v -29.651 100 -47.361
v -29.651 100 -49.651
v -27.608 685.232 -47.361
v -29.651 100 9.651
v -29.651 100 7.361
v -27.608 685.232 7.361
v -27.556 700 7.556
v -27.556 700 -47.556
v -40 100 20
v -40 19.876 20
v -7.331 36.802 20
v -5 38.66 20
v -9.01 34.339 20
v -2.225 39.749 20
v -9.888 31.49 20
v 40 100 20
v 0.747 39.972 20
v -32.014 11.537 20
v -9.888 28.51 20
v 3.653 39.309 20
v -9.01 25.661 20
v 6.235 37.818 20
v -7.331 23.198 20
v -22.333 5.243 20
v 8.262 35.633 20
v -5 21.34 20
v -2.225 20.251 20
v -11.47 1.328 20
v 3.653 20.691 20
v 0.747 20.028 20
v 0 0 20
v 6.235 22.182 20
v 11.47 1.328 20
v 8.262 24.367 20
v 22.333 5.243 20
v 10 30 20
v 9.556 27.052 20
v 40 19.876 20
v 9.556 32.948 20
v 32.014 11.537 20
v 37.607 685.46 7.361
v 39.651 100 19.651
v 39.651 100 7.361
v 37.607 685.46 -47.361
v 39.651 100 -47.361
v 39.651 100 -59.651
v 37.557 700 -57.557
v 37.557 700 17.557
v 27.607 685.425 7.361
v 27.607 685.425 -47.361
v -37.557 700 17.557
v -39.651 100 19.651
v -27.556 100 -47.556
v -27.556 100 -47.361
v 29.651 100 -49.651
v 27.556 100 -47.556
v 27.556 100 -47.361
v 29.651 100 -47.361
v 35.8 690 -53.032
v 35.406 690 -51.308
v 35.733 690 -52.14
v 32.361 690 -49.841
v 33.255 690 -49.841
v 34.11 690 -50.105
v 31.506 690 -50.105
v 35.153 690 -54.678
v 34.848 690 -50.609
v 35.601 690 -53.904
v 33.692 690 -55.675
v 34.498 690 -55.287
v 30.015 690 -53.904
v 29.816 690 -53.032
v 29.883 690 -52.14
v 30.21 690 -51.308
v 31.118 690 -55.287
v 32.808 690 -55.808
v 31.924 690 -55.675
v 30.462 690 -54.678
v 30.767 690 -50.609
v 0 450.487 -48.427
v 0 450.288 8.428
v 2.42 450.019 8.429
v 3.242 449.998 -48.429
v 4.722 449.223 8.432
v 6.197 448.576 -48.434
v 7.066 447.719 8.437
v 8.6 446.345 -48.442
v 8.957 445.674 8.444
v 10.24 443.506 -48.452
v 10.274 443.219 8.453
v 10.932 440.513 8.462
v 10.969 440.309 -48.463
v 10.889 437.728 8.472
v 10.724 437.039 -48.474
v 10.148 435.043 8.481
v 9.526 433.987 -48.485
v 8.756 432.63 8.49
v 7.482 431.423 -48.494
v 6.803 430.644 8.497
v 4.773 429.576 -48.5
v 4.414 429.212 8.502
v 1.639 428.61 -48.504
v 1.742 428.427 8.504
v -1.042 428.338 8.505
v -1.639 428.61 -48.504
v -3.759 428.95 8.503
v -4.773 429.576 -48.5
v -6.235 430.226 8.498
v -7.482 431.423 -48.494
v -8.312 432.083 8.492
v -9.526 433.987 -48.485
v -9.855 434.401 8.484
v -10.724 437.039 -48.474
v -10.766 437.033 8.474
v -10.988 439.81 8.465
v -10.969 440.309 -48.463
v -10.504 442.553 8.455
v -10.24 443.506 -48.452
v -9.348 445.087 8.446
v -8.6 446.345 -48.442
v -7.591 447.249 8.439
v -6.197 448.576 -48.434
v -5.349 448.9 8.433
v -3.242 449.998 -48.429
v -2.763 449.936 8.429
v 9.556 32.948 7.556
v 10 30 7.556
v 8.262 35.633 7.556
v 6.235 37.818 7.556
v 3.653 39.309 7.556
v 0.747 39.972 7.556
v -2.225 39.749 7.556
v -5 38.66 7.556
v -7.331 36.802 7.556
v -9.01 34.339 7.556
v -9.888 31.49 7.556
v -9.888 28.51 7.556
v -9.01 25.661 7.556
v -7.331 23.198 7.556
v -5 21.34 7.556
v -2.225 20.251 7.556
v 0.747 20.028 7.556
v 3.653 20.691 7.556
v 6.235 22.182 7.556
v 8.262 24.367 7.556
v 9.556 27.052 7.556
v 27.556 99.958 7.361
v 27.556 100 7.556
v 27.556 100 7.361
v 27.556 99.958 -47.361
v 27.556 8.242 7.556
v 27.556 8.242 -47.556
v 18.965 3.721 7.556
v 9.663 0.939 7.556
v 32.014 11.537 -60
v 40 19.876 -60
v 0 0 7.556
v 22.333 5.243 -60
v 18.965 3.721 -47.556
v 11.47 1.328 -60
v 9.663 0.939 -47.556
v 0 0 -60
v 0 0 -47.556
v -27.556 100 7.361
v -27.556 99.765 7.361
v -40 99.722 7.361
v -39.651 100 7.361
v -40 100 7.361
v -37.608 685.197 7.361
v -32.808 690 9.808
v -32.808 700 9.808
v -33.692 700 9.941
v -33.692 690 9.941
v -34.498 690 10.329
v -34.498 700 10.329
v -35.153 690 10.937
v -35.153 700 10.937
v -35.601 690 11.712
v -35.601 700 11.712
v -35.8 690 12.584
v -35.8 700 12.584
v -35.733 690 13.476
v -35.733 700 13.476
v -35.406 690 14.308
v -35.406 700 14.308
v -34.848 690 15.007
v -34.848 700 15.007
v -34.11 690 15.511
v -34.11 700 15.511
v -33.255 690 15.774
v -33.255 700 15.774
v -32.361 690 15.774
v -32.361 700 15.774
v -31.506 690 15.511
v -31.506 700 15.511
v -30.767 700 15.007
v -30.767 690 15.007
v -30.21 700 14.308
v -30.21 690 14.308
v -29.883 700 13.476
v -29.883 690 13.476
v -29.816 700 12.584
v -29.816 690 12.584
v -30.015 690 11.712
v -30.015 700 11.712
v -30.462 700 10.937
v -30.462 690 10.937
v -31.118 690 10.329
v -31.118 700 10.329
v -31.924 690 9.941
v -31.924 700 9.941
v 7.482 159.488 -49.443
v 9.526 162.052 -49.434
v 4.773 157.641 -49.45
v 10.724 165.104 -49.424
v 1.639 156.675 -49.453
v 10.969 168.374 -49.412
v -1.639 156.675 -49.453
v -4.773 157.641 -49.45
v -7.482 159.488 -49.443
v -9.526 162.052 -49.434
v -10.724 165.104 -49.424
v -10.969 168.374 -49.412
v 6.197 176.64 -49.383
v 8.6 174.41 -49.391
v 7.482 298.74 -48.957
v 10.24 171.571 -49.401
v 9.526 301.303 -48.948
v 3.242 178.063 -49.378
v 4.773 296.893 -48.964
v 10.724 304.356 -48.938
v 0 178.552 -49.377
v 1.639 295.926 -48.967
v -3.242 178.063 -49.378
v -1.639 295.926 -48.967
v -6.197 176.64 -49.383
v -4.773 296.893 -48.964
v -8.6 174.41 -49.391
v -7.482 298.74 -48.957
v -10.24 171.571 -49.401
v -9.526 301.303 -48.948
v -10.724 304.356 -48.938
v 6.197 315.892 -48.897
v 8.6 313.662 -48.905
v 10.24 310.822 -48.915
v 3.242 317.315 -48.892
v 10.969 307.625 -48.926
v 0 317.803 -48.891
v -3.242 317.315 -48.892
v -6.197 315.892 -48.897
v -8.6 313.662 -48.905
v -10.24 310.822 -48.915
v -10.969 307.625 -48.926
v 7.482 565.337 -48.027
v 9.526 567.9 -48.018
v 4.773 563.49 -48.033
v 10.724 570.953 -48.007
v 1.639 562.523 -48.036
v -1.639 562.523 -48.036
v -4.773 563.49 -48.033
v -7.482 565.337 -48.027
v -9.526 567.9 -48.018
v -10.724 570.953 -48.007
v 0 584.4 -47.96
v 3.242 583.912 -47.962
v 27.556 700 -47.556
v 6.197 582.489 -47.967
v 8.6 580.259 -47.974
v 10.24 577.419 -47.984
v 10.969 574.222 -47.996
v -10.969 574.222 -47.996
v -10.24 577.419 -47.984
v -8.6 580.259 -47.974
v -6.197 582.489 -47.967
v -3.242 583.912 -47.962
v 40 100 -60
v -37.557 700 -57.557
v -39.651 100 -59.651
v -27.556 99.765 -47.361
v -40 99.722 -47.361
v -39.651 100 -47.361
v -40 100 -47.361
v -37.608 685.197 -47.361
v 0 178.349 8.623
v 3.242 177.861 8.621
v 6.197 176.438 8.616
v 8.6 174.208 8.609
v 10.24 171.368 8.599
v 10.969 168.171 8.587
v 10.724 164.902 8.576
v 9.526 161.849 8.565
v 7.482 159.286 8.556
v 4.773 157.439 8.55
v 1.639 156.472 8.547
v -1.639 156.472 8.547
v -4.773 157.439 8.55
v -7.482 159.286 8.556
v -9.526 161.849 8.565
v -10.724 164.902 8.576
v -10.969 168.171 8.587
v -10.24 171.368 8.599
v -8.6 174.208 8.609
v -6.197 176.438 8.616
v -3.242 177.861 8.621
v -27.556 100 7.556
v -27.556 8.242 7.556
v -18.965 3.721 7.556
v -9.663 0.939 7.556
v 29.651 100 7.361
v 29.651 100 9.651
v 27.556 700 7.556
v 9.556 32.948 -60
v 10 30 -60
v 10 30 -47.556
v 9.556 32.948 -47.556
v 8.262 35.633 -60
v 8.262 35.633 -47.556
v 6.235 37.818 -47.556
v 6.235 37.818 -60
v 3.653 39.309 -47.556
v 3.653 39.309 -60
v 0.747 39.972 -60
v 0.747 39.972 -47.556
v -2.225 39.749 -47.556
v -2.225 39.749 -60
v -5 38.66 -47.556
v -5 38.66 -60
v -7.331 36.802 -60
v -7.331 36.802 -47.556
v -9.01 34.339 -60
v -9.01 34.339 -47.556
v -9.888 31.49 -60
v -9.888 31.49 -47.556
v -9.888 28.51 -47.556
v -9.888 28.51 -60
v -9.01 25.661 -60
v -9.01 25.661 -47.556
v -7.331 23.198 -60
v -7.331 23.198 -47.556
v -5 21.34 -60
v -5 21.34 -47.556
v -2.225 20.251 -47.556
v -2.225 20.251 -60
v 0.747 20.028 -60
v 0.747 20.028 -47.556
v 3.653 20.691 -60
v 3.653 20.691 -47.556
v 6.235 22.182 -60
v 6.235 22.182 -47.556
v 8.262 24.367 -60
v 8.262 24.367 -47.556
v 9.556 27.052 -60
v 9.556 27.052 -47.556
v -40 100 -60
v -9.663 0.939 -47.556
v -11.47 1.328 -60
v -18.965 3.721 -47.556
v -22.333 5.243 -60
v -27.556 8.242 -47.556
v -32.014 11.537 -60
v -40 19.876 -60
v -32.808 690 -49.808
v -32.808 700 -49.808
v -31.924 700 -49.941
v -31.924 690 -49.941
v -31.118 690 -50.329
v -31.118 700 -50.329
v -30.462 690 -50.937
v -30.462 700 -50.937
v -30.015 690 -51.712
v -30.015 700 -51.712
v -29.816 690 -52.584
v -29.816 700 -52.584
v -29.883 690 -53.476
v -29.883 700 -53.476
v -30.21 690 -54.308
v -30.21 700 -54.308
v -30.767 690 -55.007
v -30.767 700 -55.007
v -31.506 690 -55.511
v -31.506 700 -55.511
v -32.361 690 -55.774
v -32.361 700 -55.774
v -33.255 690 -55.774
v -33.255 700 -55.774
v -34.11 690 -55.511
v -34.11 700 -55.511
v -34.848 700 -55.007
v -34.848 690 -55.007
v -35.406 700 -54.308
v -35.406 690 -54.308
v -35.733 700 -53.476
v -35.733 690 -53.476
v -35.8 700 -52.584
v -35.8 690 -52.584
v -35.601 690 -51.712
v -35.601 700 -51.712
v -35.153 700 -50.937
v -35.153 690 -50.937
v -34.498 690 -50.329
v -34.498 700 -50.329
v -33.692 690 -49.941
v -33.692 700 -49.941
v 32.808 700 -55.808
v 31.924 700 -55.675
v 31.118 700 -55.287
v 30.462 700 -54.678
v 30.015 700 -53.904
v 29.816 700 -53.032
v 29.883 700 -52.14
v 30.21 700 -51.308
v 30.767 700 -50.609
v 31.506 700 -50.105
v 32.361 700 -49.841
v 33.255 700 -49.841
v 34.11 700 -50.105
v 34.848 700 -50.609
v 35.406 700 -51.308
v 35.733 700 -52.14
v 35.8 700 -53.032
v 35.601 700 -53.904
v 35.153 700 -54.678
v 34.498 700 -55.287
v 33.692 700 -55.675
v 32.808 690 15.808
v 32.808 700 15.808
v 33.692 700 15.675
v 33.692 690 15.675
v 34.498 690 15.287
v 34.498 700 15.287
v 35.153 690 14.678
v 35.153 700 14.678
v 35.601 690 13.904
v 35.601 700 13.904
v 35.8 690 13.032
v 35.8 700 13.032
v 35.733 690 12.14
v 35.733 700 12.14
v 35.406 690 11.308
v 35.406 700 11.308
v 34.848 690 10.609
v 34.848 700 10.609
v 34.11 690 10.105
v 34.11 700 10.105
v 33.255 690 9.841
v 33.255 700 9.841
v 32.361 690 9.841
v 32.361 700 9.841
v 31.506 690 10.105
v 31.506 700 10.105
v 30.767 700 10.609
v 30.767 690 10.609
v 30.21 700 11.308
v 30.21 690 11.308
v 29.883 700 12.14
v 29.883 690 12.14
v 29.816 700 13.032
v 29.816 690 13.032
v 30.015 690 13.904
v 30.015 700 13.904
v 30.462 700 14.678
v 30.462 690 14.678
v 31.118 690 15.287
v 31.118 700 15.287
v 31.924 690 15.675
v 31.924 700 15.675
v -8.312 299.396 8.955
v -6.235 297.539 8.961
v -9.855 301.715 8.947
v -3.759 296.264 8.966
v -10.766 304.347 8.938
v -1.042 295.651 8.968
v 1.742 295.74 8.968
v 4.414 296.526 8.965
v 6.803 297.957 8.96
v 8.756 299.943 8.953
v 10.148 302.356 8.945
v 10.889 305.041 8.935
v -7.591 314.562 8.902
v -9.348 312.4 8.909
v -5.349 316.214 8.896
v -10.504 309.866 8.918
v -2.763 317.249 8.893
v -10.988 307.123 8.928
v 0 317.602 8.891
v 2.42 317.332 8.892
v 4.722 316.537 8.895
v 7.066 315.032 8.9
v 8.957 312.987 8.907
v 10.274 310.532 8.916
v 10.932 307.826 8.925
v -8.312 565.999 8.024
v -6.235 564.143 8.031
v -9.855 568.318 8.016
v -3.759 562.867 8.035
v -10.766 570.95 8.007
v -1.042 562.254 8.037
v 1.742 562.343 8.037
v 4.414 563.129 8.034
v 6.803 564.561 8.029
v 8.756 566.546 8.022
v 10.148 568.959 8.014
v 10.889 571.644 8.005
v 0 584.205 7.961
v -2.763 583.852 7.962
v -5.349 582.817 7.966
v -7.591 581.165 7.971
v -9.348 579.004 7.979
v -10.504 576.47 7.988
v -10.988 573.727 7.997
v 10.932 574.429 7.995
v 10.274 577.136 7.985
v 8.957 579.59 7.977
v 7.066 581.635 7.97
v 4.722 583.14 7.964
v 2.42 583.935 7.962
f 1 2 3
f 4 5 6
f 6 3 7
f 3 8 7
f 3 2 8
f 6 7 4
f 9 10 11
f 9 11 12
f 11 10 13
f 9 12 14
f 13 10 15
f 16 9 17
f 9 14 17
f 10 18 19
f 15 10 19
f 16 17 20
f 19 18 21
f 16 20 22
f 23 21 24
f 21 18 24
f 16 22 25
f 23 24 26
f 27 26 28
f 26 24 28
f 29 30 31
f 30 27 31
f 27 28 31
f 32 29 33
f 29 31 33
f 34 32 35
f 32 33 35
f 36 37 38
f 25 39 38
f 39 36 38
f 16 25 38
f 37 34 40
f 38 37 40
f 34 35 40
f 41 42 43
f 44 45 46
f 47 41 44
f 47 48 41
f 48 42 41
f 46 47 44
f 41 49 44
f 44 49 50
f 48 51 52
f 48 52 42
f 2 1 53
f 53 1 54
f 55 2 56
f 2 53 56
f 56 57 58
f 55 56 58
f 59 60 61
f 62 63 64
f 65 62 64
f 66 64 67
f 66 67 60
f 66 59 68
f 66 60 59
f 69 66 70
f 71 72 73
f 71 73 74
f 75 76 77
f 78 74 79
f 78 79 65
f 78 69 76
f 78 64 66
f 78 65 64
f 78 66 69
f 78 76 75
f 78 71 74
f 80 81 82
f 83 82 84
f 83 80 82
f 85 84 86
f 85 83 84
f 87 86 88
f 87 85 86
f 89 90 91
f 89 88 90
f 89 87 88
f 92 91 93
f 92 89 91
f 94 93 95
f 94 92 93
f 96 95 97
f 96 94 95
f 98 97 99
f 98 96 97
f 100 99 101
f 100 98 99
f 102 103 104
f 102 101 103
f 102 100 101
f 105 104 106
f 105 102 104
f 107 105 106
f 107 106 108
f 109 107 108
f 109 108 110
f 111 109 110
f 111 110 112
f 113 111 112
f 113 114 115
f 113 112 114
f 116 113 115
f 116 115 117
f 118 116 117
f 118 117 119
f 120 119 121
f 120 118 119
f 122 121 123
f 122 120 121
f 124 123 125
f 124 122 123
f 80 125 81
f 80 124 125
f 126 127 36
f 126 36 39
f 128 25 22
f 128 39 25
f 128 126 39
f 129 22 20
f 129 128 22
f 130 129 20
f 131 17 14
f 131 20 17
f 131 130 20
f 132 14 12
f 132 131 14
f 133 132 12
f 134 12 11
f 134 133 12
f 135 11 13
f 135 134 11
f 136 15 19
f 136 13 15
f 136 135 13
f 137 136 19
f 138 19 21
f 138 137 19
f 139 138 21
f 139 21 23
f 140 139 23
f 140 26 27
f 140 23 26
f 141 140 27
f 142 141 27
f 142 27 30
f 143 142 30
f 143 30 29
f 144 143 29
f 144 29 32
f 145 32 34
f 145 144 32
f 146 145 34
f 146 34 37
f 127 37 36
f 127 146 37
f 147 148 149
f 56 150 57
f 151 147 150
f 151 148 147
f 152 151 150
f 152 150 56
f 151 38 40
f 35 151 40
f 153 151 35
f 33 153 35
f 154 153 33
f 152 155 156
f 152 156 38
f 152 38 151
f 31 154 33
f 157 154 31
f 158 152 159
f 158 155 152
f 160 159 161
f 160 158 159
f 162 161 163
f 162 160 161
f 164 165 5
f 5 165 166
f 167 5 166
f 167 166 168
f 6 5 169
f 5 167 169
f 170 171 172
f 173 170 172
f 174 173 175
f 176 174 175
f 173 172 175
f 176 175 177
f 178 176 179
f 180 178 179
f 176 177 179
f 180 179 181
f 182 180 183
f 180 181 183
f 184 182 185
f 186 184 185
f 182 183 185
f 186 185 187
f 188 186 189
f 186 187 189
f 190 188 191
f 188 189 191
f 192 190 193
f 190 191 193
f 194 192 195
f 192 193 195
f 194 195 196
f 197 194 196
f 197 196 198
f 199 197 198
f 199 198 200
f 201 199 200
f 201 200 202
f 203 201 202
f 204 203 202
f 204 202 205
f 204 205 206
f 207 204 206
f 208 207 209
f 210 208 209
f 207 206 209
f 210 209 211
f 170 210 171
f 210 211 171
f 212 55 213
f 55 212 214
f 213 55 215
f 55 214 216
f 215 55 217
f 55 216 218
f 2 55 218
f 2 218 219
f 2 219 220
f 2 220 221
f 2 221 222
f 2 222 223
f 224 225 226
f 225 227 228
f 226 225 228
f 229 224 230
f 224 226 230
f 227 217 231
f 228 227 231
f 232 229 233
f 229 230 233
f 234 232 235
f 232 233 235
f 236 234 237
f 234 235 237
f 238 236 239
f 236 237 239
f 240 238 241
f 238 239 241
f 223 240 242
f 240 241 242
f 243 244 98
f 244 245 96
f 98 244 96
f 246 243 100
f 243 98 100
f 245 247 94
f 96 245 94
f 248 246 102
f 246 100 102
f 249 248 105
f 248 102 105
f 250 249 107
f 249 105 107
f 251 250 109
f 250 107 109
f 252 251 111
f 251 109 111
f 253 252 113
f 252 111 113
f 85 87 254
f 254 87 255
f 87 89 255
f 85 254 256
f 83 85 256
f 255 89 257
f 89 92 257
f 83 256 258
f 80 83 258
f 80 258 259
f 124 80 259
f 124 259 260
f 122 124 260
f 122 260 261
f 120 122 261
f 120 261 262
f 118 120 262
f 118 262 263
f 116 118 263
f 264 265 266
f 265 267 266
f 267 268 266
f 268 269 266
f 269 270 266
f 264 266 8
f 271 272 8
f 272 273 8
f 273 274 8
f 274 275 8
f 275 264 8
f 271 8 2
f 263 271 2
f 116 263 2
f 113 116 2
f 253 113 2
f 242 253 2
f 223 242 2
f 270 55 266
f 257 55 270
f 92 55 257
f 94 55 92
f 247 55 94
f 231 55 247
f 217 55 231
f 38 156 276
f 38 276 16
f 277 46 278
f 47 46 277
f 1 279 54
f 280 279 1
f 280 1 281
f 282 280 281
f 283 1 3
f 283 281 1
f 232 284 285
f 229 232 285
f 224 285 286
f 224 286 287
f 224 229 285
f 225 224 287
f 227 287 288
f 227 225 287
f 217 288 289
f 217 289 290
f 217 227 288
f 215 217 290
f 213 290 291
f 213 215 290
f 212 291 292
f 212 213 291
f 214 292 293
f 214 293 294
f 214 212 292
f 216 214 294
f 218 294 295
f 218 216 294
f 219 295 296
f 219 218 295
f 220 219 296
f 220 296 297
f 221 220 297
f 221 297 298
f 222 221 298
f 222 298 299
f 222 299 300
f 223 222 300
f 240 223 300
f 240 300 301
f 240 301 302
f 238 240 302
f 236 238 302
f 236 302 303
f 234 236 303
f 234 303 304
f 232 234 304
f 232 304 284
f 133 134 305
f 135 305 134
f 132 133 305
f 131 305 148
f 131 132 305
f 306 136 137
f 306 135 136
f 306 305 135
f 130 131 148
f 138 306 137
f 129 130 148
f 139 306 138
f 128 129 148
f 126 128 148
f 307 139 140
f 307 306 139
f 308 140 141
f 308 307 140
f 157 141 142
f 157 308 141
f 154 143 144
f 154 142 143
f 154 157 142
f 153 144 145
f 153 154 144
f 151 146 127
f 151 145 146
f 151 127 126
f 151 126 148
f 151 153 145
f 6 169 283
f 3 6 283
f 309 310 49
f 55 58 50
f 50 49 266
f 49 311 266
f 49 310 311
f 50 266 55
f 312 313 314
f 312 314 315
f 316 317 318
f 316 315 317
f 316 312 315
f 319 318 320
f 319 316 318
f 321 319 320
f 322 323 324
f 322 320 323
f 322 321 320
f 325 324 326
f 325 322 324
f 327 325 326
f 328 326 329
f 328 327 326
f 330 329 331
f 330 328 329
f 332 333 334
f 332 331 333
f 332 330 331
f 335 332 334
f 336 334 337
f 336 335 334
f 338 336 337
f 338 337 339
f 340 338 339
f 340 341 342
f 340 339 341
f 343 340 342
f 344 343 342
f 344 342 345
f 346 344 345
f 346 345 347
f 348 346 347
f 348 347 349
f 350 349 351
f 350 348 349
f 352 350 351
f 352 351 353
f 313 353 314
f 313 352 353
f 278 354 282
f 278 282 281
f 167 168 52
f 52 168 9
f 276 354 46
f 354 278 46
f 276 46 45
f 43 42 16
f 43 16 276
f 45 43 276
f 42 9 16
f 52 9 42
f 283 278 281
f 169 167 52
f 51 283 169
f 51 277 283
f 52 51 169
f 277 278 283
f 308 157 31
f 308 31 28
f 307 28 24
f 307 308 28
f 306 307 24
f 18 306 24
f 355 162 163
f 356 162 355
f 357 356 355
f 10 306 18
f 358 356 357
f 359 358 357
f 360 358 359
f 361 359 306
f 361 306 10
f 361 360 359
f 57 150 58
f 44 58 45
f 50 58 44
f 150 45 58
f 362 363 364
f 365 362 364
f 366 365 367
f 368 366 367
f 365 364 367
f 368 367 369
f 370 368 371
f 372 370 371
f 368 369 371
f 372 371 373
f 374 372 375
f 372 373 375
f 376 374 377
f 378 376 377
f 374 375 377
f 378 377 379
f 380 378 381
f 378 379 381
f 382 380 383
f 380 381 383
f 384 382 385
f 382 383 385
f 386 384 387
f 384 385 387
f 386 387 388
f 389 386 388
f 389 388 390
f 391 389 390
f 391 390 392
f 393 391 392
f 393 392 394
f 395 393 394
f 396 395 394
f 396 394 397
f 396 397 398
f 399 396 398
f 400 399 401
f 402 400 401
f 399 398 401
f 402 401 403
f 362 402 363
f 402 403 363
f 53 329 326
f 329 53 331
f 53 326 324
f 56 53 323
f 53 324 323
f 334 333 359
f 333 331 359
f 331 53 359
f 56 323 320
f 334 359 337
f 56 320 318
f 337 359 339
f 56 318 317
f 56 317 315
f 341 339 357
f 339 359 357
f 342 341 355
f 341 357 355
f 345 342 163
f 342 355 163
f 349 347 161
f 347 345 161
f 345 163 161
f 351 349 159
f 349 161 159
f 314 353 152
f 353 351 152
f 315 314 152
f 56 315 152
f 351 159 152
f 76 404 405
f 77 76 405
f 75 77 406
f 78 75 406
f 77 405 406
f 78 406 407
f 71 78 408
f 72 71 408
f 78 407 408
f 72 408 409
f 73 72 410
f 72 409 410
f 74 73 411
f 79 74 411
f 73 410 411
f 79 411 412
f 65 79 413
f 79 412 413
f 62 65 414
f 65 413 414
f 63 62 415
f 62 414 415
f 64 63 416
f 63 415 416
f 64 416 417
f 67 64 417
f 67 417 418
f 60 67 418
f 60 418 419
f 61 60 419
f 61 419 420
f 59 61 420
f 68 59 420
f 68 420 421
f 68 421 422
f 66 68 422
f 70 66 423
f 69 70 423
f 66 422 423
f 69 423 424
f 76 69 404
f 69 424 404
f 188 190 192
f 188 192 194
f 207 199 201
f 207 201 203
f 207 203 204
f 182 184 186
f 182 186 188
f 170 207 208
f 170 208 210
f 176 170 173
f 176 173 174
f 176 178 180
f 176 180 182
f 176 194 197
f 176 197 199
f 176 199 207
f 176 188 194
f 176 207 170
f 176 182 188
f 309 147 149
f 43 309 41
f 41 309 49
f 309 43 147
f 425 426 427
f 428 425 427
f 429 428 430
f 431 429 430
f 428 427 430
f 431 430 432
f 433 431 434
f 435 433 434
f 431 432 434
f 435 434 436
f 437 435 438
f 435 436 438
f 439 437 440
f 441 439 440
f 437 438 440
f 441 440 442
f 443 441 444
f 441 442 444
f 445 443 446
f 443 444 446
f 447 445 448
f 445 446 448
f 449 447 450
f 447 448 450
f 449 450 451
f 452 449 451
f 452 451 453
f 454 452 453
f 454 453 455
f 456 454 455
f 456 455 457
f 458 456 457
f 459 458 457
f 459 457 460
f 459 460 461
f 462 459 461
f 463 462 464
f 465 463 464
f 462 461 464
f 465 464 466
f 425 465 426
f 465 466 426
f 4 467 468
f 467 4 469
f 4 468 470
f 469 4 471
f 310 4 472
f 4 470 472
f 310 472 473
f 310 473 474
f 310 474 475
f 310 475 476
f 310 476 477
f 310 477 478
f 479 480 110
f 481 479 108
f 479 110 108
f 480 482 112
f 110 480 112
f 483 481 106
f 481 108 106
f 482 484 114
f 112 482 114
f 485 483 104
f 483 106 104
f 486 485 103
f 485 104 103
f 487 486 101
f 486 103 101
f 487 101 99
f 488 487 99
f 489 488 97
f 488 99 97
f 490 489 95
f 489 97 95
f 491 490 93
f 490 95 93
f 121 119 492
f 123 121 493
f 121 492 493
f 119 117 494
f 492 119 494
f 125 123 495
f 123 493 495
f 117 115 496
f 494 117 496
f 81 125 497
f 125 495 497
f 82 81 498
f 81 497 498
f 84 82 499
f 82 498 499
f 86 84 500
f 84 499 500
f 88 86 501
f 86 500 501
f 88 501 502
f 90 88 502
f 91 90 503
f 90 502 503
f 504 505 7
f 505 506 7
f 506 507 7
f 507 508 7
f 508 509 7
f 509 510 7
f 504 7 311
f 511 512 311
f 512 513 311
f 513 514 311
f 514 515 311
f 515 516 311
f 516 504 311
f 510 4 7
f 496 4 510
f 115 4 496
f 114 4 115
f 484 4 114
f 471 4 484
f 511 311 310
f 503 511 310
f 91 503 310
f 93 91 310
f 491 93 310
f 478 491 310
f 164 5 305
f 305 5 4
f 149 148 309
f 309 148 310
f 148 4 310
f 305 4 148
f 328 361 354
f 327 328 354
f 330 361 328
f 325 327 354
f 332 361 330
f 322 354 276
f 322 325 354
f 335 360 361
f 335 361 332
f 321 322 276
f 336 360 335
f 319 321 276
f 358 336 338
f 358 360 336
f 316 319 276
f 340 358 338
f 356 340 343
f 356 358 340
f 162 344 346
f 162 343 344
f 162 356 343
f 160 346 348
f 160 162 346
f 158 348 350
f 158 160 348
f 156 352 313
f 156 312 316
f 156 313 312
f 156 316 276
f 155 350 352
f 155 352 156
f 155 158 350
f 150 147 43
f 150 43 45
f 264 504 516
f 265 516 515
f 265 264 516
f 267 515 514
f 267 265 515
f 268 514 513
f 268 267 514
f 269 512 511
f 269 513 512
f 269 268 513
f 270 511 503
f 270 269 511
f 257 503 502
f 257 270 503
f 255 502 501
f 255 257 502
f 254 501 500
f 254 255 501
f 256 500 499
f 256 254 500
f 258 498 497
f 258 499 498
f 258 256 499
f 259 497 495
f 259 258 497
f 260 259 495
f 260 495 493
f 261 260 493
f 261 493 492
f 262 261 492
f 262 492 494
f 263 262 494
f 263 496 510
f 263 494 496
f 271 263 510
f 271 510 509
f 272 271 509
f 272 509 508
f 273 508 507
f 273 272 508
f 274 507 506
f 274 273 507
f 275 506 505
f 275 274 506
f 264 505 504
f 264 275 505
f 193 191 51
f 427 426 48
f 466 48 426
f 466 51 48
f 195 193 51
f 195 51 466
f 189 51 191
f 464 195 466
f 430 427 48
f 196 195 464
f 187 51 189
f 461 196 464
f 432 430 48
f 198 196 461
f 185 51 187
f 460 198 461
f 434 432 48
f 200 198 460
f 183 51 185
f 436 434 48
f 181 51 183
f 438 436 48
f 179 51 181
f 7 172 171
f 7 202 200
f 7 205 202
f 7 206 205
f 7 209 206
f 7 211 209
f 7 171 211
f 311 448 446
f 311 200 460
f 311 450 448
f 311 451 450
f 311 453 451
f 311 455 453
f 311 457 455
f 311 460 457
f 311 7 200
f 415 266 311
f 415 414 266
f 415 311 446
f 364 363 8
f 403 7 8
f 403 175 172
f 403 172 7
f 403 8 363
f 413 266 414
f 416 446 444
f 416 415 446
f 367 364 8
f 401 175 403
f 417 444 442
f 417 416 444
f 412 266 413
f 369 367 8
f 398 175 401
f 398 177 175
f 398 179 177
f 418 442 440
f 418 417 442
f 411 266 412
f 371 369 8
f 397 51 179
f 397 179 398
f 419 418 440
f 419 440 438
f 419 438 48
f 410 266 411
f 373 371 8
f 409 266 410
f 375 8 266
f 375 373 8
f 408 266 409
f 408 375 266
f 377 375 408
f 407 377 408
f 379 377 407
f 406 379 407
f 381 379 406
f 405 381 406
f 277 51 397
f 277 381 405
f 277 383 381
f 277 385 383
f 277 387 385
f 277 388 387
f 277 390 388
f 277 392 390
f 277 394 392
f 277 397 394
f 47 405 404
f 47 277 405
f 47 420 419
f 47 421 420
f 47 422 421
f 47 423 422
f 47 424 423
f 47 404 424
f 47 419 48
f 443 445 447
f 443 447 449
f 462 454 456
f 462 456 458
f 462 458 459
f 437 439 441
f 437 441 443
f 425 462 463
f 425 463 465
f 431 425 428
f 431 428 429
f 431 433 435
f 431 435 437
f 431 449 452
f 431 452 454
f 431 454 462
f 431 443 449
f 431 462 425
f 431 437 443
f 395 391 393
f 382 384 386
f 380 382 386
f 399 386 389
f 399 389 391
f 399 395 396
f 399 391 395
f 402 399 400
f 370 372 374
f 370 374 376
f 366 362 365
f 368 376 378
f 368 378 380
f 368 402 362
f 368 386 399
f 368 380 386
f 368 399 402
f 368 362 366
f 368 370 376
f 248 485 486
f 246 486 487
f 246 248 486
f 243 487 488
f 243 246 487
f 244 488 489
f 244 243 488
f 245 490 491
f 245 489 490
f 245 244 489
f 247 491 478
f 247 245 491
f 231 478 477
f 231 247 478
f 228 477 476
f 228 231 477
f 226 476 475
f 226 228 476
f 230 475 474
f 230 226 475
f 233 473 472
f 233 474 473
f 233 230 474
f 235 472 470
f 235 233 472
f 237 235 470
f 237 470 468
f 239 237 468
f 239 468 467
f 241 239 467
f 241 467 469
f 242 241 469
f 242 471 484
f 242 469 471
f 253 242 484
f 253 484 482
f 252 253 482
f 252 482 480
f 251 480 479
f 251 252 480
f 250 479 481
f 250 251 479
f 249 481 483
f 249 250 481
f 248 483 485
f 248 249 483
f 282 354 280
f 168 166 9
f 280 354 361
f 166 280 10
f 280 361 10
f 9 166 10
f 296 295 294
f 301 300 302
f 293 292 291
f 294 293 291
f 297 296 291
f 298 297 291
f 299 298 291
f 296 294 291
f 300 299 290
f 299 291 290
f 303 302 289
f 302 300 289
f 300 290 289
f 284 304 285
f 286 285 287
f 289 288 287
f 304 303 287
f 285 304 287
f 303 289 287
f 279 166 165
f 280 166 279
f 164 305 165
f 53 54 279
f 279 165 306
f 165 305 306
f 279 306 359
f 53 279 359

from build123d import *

# Parameters (mm, degrees)
SKETCH1_W               = 80
SKETCH1_H               = 80
BOSS_EXTRUDE1_DEPTH     = 700
BOSS_EXTRUDE1_TAPER     = 0.2
SHELL2_T                = -10
SKETCH2_R               = 3
CUT_EXTRUDE1_DEPTH      = 10
CUT_EXTRUDE2_DEPTH      = 704.704483544
CUT_EXTRUDE2_DEPTH_BACK = 704.704483544
SKETCH4_W               = 55.112936398
SKETCH4_H               = 55.112936398
SKETCH8_W               = 80
SKETCH8_H               = 80
SKETCH8_W_2             = 55.112936398
SKETCH8_H_2             = 55.112936398
BOSS_EXTRUDE3_DEPTH     = 100
CUT_EXTRUDE4_DEPTH      = 706.691150691
CUT_EXTRUDE4_DEPTH_BACK = 706.691150691
SKETCH9_R               = 10
CUT_EXTRUDE5_DEPTH      = 706.691150691
CUT_EXTRUDE5_DEPTH_BACK = 706.691150691
CUT_EXTRUDE6_DEPTH      = 707.968504527
CUT_EXTRUDE6_DEPTH_BACK = 707.968504527
SKETCH13_W              = 54.721685152
SKETCH13_H              = 585.463174199
SKETCH14_R              = 11
BOSS_EXTRUDE4_DEPTH     = 68


with BuildPart() as part:
    # Sketch1 → Boss-Extrude1 (new body)
    with BuildSketch(Plane(origin=(0, 0, 0), x_dir=(1, 0, 0), z_dir=(0, 1, 0))):
        with Locations((0, 20)):
            Rectangle(SKETCH1_W, SKETCH1_H)
    extrude(amount=BOSS_EXTRUDE1_DEPTH, taper=BOSS_EXTRUDE1_TAPER)

    # Shell2
    shell2_openings = [part.faces().sort_by_distance(p)[0] for p in [
        (0, 700, -20),
    ]]
    offset(amount=SHELL2_T, openings=shell2_openings, kind=Kind.INTERSECTION)

    # Sketch2 → Cut-Extrude1 (cut)
    with BuildSketch(Plane(origin=(0, 700, 0), x_dir=(1, 0, 0), z_dir=(0, 1, 0))):
        with Locations((-32.80796506, 52.80796506)):
            Circle(SKETCH2_R)
        with Locations((32.80796506, 52.80796506)):
            Circle(SKETCH2_R)
        with Locations((32.80796506, -12.80796506)):
            Circle(SKETCH2_R)
        with Locations((-32.80796506, -12.80796506)):
            Circle(SKETCH2_R)
    extrude(amount=-CUT_EXTRUDE1_DEPTH, mode=Mode.SUBTRACT)

    # Sketch4 → Cut-Extrude2 (cut, two sides: drawn at the far end of the back side and taken through both)
    with BuildSketch(Plane(origin=(0, 700, 0), x_dir=(1, 0, 0), z_dir=(0, 1, 0)).offset(-CUT_EXTRUDE2_DEPTH_BACK)):
        with Locations((0, 20)):
            Rectangle(SKETCH4_W, SKETCH4_H)
    extrude(amount=CUT_EXTRUDE2_DEPTH + CUT_EXTRUDE2_DEPTH_BACK, mode=Mode.SUBTRACT)

    # Sketch8 → Boss-Extrude3 (add)
    with BuildSketch(Plane.XZ):
        with Locations((0, -20)):
            Rectangle(SKETCH8_W, SKETCH8_H)
        with Locations((0, -20)):
            Rectangle(SKETCH8_W_2, SKETCH8_H_2, mode=Mode.SUBTRACT)
    extrude(amount=-BOSS_EXTRUDE3_DEPTH)

    # Sketch9 → Cut-Extrude4 (cut, two sides: drawn at the far end of the back side and taken through both)
    with BuildSketch(Plane.XY.offset(20).offset(-CUT_EXTRUDE4_DEPTH_BACK)):
        with Locations((0, 30)):
            Circle(SKETCH9_R)
    extrude(amount=CUT_EXTRUDE4_DEPTH + CUT_EXTRUDE4_DEPTH_BACK, mode=Mode.SUBTRACT)

    # Sketch10 → Cut-Extrude5 (cut, two sides: drawn at the far end of the back side and taken through both)
    with BuildSketch(Plane.XY.offset(20).offset(-CUT_EXTRUDE5_DEPTH_BACK)):
        with BuildLine():
            Line((-1.42e-07, 0), (40, 0))
            Line((40, 0), (40, 19.876189785))
            ThreePointArc((40, 19.876189785), (22.333063544, 5.242902004), (-1.42e-07, 0))
        make_face()
        with BuildLine():
            Line((-40, 0), (-1.42e-07, 0))
            ThreePointArc((-1.42e-07, 0), (-22.333063671, 5.242902067), (-40, 19.876189785))
            Line((-40, 19.876189785), (-40, 0))
        make_face()
    extrude(amount=CUT_EXTRUDE5_DEPTH + CUT_EXTRUDE5_DEPTH_BACK, mode=Mode.SUBTRACT)

    # Sketch13 → Cut-Extrude6 (cut, two sides: drawn at the far end of the back side and taken through both)
    with BuildSketch(Plane(origin=(39.999512614, 0.139625206, 0), x_dir=(0, 0, -1), z_dir=(0.9999939076577905, 0.0034906514152237404, 0)).offset(-CUT_EXTRUDE6_DEPTH_BACK)):
        with Locations((20, 392.592570281)):
            Rectangle(SKETCH13_W, SKETCH13_H)
    extrude(amount=CUT_EXTRUDE6_DEPTH + CUT_EXTRUDE6_DEPTH_BACK, mode=Mode.SUBTRACT)

    # Sketch14 → Boss-Extrude4 (add)
    with BuildSketch(Plane(origin=(0, 0.209437809, -59.999268921), x_dir=(-1, 0, 0), z_dir=(0, 0.0034906514152237404, -0.9999939076577905))):
        with Locations((0, 167.378380539)):
            Circle(SKETCH14_R)
        with Locations((0, 306.630729062)):
            Circle(SKETCH14_R)
        with Locations((0, 439.3151205)):
            Circle(SKETCH14_R)
        with Locations((0, 573.229273125)):
            Circle(SKETCH14_R)
    extrude(amount=-BOSS_EXTRUDE4_DEPTH)


solid = part.part
